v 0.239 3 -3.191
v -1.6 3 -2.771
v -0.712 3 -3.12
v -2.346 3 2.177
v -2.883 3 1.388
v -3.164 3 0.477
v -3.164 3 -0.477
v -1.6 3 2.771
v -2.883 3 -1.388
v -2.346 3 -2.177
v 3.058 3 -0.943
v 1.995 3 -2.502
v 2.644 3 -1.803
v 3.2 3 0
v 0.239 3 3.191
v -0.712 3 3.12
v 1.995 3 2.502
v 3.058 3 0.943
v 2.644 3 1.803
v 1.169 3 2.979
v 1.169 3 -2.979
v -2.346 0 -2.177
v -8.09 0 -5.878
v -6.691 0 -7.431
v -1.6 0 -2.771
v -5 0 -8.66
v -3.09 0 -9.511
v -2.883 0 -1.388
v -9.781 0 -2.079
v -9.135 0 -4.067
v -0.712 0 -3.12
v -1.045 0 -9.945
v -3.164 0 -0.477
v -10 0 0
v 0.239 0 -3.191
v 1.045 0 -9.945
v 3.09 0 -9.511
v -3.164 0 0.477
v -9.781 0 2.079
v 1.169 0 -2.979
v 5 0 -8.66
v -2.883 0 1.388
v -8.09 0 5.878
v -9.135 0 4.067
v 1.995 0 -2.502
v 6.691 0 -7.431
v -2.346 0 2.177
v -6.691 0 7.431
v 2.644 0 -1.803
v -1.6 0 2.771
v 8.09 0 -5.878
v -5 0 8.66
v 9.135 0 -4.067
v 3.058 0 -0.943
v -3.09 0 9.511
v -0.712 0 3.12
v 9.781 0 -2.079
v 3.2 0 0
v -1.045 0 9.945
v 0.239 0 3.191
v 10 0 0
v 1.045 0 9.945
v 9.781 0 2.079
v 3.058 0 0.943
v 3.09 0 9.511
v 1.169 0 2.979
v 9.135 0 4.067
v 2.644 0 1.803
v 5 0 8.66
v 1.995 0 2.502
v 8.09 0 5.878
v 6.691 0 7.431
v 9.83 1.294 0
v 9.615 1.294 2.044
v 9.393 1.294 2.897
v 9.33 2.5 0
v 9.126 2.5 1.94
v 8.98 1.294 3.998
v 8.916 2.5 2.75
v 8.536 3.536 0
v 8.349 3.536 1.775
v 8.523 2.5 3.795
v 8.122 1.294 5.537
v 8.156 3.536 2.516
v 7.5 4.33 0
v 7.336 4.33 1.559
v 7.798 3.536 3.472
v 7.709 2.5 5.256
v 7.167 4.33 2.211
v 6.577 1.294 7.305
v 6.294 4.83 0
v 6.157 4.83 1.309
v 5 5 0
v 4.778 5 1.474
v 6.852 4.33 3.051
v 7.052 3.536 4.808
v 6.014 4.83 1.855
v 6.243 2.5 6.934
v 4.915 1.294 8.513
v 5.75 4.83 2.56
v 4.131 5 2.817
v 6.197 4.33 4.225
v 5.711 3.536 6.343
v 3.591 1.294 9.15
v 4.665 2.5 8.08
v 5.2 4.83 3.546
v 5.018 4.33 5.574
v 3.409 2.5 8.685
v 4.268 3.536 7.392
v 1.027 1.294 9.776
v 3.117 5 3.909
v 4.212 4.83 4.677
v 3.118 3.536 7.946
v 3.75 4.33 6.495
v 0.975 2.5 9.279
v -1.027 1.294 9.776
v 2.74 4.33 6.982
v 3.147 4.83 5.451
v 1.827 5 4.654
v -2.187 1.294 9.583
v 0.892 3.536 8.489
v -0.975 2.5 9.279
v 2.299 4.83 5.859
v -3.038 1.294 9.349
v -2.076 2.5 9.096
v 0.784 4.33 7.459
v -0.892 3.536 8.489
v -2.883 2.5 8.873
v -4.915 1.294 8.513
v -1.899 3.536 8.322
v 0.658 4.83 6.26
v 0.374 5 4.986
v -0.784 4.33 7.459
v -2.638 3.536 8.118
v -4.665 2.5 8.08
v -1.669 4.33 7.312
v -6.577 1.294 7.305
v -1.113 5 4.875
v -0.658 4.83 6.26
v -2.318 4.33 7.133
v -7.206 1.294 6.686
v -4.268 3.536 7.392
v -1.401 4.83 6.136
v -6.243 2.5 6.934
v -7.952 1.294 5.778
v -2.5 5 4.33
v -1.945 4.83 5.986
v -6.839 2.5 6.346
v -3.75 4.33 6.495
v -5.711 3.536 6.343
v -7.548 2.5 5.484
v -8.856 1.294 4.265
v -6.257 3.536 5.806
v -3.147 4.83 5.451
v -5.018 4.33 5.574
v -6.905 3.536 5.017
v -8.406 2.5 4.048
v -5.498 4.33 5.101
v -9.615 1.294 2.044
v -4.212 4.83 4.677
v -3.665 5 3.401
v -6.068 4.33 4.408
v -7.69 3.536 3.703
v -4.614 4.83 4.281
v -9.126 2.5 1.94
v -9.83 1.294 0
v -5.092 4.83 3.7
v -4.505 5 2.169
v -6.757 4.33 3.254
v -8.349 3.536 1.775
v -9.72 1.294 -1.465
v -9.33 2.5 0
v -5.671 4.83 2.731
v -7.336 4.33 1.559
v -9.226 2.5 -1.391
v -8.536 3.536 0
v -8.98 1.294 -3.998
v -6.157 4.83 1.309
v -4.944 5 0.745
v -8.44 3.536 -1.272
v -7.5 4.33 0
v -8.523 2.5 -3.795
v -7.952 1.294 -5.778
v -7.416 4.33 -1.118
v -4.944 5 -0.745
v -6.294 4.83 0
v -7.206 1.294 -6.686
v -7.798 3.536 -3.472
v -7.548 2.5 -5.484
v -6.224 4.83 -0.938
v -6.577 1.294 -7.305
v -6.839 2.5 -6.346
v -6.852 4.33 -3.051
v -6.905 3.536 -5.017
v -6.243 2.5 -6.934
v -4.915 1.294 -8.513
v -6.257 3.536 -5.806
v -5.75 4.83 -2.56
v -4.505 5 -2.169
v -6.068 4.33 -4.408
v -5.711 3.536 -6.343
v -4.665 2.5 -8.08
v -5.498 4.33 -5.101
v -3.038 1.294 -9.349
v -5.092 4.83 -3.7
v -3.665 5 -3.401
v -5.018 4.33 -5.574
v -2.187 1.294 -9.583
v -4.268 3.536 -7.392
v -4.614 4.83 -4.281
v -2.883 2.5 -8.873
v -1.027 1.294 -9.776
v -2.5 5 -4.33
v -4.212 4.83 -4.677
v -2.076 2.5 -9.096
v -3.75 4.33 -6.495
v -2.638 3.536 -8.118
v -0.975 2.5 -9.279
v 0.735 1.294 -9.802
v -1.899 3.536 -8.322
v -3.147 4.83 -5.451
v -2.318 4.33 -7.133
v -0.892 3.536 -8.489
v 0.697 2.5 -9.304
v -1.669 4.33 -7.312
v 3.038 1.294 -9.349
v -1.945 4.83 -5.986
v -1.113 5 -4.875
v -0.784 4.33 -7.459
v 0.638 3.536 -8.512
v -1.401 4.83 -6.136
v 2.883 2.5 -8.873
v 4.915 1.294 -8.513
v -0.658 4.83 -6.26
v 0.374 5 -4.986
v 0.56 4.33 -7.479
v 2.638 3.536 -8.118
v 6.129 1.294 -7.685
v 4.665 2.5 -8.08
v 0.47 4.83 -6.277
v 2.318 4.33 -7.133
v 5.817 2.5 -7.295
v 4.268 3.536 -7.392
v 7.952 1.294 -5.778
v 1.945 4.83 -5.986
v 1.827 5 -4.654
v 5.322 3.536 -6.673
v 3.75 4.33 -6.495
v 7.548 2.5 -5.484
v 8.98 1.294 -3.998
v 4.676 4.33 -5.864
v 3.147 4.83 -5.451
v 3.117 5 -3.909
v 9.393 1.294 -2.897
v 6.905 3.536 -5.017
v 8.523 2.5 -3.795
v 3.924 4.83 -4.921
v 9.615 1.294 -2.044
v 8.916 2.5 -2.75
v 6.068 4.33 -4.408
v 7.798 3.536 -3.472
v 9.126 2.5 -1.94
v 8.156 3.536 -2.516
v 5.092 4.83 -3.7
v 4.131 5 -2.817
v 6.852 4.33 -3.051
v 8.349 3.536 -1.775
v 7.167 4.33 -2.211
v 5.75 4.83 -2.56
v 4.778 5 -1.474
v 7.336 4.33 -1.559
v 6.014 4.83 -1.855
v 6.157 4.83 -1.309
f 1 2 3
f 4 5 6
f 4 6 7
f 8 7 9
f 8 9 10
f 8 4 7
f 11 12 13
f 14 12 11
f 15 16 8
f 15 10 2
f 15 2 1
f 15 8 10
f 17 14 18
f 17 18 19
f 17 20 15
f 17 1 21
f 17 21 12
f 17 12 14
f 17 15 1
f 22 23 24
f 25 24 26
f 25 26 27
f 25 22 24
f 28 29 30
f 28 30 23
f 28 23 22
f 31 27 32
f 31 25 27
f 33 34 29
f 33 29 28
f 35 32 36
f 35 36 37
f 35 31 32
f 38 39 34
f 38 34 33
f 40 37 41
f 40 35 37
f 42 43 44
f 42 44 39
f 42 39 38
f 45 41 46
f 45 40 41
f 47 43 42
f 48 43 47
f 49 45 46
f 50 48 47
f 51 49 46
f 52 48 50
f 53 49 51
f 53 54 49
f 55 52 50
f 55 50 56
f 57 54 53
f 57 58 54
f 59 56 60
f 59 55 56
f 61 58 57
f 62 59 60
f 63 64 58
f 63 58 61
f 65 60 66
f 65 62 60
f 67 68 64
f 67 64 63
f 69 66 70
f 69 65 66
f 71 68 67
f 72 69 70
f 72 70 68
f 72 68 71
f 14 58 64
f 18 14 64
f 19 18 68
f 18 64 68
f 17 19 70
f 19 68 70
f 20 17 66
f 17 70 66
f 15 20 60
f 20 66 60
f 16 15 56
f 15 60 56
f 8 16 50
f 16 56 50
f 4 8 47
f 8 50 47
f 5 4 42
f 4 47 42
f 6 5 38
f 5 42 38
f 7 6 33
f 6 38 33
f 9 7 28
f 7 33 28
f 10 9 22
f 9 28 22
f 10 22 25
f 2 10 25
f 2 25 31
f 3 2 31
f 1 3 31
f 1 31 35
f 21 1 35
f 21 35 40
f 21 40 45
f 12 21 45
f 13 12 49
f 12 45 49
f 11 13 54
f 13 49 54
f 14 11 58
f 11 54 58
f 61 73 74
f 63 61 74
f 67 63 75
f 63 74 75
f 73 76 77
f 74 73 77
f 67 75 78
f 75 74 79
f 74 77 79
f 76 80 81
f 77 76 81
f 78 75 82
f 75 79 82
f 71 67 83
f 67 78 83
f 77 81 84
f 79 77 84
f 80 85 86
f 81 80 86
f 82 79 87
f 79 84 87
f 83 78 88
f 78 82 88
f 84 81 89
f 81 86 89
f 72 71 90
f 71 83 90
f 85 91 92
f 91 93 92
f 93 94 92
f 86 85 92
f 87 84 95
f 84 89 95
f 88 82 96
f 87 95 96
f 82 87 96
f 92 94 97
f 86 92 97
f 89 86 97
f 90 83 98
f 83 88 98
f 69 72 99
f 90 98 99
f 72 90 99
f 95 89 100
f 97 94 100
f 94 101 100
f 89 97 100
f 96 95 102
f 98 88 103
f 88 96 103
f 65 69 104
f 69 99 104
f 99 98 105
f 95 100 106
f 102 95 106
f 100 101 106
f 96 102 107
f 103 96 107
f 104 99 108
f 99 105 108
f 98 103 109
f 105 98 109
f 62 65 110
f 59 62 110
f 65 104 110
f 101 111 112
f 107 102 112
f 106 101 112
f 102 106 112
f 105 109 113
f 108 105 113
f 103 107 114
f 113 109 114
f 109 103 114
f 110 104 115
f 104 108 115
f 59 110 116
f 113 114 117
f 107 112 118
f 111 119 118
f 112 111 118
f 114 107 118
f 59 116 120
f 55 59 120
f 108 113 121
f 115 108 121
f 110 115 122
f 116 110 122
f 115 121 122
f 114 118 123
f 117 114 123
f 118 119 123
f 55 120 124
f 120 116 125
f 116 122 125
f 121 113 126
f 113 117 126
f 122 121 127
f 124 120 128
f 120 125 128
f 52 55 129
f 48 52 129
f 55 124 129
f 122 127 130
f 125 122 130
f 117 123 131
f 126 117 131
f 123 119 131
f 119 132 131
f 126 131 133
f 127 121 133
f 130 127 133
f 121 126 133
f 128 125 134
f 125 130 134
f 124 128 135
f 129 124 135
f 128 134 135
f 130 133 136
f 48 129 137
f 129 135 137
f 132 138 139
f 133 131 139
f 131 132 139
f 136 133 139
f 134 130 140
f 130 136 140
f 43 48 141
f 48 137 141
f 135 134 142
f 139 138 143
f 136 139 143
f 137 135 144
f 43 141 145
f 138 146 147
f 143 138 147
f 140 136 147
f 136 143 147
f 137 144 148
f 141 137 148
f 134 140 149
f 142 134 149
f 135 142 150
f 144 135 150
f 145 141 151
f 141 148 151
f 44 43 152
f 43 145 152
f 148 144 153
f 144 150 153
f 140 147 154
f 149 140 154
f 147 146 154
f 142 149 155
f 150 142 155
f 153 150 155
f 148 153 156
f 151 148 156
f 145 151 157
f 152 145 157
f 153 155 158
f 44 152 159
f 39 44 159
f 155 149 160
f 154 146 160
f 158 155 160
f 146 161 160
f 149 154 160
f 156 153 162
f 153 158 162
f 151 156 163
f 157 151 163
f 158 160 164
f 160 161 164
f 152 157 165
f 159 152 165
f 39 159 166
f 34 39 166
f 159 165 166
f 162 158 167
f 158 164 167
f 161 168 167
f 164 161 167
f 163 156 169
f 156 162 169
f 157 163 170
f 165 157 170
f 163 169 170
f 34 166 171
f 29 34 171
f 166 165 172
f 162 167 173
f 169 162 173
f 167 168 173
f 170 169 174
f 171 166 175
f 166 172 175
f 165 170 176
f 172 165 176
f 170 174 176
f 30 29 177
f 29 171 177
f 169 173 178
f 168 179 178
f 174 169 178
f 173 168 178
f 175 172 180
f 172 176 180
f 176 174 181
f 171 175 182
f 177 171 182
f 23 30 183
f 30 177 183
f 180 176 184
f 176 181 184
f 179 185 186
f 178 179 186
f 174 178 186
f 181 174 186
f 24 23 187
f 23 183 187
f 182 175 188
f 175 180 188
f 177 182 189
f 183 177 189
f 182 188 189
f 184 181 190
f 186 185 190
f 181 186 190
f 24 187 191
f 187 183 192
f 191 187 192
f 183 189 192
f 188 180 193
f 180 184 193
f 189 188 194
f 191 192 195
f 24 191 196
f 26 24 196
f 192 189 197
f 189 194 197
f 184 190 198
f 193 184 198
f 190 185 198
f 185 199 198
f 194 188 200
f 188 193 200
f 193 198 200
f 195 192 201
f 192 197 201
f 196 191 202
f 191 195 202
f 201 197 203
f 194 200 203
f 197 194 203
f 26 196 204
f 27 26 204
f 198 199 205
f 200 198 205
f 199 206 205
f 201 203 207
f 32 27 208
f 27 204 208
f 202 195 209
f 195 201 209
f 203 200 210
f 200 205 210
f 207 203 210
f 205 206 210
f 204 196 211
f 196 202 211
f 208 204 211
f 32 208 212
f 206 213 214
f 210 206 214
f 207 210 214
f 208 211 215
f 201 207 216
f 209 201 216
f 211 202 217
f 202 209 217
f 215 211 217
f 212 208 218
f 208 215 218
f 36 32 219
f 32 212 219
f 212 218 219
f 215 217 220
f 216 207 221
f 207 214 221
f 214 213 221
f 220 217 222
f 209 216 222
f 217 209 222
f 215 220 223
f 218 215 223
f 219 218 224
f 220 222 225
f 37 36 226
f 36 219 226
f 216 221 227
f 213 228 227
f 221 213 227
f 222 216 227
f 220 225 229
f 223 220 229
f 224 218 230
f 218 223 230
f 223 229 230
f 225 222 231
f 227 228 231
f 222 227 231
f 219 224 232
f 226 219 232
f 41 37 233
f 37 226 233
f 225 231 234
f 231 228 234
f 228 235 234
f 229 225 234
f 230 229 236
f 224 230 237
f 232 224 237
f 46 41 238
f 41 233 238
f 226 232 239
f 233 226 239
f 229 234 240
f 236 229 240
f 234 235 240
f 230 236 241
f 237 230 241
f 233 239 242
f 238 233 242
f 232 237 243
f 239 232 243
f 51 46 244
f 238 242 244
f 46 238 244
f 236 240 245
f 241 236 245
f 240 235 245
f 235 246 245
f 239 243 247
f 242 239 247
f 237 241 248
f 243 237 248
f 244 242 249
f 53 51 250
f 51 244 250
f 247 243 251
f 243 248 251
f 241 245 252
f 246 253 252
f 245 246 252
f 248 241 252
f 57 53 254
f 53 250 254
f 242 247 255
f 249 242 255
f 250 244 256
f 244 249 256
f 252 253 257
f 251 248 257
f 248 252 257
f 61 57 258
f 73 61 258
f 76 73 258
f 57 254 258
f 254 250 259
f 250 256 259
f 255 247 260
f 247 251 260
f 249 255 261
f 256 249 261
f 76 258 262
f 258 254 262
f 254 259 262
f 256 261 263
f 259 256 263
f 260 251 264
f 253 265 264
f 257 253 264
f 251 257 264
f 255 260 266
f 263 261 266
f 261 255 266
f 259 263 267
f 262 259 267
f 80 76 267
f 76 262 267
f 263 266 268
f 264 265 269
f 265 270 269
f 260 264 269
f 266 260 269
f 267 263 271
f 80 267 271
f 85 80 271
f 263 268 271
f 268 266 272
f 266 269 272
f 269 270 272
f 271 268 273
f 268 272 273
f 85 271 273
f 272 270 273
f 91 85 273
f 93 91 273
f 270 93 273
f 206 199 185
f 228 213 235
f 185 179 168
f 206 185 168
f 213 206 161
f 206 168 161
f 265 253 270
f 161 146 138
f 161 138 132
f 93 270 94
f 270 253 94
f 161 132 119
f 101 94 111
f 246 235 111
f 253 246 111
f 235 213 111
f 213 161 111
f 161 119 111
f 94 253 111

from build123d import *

# Parameters (mm, degrees)
F0_R     = 10
F1_DEPTH = 5
F2_R     = 4.99999
F3_R     = 3.2
F4_DEPTH = 3


# Not quite as in the source:
# - a fillet or chamfer is up to 0.001 mm smaller than in the source, because OpenCascade refuses the exact size


with BuildPart() as f1:
    # F0 (on Front) → F1 (new body)
    with BuildSketch(Plane.XZ):
        Circle(F0_R)
    extrude(amount=-F1_DEPTH)

    # F2 (radius 5 in the source; OpenCascade refuses exactly that, so slightly less here)
    f2_edges = [f1.edges().sort_by_distance(p)[0] for p in [
        (-10, 5, 0),
    ]]
    fillet(f2_edges, radius=F2_R)

    # F3 (on Front) → F4 (cut)
    with BuildSketch(Plane.XZ):
        Circle(F3_R)
    extrude(amount=-F4_DEPTH, mode=Mode.SUBTRACT)


solid = f1.part
